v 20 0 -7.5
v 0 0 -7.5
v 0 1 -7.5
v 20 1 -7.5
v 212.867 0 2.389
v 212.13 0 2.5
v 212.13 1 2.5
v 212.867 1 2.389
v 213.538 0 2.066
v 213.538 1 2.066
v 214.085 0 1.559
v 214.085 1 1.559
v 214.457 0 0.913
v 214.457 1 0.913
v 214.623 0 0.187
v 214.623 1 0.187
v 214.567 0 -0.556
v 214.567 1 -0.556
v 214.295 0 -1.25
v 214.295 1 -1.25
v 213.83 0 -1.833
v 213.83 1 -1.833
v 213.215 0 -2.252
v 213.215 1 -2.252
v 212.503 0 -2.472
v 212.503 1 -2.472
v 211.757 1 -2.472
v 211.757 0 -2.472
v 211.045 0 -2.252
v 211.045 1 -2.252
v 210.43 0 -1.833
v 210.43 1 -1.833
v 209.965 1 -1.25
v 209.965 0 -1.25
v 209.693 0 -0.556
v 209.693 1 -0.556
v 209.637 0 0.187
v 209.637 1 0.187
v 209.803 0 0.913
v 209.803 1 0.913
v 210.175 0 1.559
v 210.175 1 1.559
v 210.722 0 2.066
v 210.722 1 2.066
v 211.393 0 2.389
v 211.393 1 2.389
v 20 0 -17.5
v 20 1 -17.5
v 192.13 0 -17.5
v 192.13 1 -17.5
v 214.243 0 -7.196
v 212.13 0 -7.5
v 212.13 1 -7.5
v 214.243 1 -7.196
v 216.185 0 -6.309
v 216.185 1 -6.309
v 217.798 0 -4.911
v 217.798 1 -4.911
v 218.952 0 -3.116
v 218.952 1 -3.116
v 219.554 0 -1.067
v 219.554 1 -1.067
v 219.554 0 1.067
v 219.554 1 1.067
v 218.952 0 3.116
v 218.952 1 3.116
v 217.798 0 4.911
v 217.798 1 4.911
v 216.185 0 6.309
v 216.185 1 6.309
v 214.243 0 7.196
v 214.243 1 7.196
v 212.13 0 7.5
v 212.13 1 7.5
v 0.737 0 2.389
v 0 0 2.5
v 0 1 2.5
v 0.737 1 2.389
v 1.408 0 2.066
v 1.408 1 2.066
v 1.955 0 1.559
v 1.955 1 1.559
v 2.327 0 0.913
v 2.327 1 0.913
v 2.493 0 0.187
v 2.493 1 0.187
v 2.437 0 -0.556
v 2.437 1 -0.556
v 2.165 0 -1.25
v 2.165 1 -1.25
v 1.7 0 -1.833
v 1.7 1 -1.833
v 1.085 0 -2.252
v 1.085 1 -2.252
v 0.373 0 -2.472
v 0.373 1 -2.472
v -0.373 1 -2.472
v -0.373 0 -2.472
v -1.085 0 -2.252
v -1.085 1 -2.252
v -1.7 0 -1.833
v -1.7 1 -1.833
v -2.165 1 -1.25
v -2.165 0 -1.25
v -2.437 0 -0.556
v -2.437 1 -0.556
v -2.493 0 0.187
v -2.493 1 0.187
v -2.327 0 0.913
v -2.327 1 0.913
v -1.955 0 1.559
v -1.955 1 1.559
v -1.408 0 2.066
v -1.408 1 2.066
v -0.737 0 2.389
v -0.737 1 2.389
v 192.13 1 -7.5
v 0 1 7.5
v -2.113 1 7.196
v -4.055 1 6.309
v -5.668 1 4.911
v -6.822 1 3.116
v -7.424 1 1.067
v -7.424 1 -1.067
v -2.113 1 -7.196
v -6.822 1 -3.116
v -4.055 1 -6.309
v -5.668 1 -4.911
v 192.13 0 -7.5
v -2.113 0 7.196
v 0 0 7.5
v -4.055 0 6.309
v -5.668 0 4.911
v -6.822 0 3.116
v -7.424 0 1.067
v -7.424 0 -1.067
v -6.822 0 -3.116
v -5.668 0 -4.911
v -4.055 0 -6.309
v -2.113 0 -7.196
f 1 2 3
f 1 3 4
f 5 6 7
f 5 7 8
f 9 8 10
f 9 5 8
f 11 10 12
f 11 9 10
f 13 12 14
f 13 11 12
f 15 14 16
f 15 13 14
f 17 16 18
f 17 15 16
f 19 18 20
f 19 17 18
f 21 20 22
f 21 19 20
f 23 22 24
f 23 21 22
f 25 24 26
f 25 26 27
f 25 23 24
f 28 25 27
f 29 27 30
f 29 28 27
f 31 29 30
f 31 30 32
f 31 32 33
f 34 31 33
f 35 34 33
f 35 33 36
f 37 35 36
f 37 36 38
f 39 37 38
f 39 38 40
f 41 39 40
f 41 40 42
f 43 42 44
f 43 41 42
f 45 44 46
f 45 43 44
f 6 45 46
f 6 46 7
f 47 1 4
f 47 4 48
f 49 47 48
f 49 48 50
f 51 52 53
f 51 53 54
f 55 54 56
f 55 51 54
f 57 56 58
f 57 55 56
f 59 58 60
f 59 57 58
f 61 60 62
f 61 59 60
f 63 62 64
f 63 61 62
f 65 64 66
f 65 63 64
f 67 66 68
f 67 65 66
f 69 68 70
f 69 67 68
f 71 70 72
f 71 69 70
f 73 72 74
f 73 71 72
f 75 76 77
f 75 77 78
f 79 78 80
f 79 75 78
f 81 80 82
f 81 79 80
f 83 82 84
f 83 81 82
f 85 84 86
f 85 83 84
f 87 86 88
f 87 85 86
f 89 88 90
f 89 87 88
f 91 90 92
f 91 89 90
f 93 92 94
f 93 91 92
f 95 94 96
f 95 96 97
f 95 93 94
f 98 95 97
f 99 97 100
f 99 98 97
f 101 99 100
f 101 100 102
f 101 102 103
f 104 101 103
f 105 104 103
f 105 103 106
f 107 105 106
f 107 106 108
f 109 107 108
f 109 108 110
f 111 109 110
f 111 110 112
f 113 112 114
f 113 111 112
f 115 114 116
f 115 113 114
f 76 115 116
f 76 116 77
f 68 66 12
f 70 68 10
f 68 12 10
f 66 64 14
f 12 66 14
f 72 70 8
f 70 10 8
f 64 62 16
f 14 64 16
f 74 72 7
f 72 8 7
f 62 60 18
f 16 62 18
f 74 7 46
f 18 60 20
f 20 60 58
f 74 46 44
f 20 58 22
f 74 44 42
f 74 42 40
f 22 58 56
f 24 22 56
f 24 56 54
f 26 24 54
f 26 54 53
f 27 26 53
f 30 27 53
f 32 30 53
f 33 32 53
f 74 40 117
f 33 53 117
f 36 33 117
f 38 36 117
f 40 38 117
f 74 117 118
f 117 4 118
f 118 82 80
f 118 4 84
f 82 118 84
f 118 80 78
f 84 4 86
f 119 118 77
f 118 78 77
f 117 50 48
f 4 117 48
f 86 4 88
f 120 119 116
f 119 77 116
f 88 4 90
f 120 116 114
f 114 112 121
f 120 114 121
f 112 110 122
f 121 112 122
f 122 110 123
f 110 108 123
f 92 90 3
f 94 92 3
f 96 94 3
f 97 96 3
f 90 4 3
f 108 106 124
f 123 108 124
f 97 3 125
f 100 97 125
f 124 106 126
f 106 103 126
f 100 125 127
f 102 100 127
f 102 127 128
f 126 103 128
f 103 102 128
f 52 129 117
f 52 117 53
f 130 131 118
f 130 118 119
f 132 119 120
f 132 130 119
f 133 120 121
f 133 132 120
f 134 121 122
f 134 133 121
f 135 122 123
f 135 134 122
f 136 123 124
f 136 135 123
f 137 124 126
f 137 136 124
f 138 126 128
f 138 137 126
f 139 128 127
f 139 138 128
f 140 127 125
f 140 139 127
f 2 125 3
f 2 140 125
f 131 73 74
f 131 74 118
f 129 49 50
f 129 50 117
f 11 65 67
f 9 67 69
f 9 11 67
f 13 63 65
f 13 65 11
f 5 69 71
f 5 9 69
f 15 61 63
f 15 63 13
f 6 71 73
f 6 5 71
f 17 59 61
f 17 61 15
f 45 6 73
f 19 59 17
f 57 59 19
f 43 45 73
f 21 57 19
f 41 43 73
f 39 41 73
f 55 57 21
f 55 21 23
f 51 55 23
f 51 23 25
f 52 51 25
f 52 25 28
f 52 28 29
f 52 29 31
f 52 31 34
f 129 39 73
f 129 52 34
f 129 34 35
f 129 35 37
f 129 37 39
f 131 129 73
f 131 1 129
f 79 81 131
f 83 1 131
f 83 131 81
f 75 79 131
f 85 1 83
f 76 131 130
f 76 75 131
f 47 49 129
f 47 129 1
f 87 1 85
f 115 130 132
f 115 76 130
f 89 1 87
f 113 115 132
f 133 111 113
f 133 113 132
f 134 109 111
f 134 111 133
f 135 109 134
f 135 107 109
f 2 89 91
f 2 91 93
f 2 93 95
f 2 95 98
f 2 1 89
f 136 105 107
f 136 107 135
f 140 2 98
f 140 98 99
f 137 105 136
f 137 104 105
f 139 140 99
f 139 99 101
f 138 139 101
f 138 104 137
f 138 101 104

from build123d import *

# Parameters (mm, degrees)
SKETCH1_R           = 2.5
BOSS_EXTRUDE1_DEPTH = 1


with BuildPart() as part:
    # Sketch1 → Boss-Extrude1 (new body)
    with BuildSketch(Plane(origin=(0, 0, 0), x_dir=(1, 0, 0), z_dir=(0, 1, 0))):
        with BuildLine():
            Line((0, 7.5), (20, 7.5))
            Line((20, 7.5), (20, 17.5))
            Line((20, 17.5), (192.13, 17.5))
            Line((192.13, 17.5), (192.13, 7.5))
            Line((192.13, 7.5), (212.13, 7.5))
            ThreePointArc((212.13, 7.5), (219.63, 0), (212.13, -7.5))
            Line((212.13, -7.5), (0, -7.5))
            ThreePointArc((0, -7.5), (-7.5, 0), (0, 7.5))
        make_face()
        with Locations(Location((0, 0, 0), (0, 0, 270))):
            Circle(SKETCH1_R, mode=Mode.SUBTRACT)
        with Locations(Location((212.13, 0, 0), (0, 0, 270))):
            Circle(SKETCH1_R, mode=Mode.SUBTRACT)
    extrude(amount=BOSS_EXTRUDE1_DEPTH)


solid = part.part
